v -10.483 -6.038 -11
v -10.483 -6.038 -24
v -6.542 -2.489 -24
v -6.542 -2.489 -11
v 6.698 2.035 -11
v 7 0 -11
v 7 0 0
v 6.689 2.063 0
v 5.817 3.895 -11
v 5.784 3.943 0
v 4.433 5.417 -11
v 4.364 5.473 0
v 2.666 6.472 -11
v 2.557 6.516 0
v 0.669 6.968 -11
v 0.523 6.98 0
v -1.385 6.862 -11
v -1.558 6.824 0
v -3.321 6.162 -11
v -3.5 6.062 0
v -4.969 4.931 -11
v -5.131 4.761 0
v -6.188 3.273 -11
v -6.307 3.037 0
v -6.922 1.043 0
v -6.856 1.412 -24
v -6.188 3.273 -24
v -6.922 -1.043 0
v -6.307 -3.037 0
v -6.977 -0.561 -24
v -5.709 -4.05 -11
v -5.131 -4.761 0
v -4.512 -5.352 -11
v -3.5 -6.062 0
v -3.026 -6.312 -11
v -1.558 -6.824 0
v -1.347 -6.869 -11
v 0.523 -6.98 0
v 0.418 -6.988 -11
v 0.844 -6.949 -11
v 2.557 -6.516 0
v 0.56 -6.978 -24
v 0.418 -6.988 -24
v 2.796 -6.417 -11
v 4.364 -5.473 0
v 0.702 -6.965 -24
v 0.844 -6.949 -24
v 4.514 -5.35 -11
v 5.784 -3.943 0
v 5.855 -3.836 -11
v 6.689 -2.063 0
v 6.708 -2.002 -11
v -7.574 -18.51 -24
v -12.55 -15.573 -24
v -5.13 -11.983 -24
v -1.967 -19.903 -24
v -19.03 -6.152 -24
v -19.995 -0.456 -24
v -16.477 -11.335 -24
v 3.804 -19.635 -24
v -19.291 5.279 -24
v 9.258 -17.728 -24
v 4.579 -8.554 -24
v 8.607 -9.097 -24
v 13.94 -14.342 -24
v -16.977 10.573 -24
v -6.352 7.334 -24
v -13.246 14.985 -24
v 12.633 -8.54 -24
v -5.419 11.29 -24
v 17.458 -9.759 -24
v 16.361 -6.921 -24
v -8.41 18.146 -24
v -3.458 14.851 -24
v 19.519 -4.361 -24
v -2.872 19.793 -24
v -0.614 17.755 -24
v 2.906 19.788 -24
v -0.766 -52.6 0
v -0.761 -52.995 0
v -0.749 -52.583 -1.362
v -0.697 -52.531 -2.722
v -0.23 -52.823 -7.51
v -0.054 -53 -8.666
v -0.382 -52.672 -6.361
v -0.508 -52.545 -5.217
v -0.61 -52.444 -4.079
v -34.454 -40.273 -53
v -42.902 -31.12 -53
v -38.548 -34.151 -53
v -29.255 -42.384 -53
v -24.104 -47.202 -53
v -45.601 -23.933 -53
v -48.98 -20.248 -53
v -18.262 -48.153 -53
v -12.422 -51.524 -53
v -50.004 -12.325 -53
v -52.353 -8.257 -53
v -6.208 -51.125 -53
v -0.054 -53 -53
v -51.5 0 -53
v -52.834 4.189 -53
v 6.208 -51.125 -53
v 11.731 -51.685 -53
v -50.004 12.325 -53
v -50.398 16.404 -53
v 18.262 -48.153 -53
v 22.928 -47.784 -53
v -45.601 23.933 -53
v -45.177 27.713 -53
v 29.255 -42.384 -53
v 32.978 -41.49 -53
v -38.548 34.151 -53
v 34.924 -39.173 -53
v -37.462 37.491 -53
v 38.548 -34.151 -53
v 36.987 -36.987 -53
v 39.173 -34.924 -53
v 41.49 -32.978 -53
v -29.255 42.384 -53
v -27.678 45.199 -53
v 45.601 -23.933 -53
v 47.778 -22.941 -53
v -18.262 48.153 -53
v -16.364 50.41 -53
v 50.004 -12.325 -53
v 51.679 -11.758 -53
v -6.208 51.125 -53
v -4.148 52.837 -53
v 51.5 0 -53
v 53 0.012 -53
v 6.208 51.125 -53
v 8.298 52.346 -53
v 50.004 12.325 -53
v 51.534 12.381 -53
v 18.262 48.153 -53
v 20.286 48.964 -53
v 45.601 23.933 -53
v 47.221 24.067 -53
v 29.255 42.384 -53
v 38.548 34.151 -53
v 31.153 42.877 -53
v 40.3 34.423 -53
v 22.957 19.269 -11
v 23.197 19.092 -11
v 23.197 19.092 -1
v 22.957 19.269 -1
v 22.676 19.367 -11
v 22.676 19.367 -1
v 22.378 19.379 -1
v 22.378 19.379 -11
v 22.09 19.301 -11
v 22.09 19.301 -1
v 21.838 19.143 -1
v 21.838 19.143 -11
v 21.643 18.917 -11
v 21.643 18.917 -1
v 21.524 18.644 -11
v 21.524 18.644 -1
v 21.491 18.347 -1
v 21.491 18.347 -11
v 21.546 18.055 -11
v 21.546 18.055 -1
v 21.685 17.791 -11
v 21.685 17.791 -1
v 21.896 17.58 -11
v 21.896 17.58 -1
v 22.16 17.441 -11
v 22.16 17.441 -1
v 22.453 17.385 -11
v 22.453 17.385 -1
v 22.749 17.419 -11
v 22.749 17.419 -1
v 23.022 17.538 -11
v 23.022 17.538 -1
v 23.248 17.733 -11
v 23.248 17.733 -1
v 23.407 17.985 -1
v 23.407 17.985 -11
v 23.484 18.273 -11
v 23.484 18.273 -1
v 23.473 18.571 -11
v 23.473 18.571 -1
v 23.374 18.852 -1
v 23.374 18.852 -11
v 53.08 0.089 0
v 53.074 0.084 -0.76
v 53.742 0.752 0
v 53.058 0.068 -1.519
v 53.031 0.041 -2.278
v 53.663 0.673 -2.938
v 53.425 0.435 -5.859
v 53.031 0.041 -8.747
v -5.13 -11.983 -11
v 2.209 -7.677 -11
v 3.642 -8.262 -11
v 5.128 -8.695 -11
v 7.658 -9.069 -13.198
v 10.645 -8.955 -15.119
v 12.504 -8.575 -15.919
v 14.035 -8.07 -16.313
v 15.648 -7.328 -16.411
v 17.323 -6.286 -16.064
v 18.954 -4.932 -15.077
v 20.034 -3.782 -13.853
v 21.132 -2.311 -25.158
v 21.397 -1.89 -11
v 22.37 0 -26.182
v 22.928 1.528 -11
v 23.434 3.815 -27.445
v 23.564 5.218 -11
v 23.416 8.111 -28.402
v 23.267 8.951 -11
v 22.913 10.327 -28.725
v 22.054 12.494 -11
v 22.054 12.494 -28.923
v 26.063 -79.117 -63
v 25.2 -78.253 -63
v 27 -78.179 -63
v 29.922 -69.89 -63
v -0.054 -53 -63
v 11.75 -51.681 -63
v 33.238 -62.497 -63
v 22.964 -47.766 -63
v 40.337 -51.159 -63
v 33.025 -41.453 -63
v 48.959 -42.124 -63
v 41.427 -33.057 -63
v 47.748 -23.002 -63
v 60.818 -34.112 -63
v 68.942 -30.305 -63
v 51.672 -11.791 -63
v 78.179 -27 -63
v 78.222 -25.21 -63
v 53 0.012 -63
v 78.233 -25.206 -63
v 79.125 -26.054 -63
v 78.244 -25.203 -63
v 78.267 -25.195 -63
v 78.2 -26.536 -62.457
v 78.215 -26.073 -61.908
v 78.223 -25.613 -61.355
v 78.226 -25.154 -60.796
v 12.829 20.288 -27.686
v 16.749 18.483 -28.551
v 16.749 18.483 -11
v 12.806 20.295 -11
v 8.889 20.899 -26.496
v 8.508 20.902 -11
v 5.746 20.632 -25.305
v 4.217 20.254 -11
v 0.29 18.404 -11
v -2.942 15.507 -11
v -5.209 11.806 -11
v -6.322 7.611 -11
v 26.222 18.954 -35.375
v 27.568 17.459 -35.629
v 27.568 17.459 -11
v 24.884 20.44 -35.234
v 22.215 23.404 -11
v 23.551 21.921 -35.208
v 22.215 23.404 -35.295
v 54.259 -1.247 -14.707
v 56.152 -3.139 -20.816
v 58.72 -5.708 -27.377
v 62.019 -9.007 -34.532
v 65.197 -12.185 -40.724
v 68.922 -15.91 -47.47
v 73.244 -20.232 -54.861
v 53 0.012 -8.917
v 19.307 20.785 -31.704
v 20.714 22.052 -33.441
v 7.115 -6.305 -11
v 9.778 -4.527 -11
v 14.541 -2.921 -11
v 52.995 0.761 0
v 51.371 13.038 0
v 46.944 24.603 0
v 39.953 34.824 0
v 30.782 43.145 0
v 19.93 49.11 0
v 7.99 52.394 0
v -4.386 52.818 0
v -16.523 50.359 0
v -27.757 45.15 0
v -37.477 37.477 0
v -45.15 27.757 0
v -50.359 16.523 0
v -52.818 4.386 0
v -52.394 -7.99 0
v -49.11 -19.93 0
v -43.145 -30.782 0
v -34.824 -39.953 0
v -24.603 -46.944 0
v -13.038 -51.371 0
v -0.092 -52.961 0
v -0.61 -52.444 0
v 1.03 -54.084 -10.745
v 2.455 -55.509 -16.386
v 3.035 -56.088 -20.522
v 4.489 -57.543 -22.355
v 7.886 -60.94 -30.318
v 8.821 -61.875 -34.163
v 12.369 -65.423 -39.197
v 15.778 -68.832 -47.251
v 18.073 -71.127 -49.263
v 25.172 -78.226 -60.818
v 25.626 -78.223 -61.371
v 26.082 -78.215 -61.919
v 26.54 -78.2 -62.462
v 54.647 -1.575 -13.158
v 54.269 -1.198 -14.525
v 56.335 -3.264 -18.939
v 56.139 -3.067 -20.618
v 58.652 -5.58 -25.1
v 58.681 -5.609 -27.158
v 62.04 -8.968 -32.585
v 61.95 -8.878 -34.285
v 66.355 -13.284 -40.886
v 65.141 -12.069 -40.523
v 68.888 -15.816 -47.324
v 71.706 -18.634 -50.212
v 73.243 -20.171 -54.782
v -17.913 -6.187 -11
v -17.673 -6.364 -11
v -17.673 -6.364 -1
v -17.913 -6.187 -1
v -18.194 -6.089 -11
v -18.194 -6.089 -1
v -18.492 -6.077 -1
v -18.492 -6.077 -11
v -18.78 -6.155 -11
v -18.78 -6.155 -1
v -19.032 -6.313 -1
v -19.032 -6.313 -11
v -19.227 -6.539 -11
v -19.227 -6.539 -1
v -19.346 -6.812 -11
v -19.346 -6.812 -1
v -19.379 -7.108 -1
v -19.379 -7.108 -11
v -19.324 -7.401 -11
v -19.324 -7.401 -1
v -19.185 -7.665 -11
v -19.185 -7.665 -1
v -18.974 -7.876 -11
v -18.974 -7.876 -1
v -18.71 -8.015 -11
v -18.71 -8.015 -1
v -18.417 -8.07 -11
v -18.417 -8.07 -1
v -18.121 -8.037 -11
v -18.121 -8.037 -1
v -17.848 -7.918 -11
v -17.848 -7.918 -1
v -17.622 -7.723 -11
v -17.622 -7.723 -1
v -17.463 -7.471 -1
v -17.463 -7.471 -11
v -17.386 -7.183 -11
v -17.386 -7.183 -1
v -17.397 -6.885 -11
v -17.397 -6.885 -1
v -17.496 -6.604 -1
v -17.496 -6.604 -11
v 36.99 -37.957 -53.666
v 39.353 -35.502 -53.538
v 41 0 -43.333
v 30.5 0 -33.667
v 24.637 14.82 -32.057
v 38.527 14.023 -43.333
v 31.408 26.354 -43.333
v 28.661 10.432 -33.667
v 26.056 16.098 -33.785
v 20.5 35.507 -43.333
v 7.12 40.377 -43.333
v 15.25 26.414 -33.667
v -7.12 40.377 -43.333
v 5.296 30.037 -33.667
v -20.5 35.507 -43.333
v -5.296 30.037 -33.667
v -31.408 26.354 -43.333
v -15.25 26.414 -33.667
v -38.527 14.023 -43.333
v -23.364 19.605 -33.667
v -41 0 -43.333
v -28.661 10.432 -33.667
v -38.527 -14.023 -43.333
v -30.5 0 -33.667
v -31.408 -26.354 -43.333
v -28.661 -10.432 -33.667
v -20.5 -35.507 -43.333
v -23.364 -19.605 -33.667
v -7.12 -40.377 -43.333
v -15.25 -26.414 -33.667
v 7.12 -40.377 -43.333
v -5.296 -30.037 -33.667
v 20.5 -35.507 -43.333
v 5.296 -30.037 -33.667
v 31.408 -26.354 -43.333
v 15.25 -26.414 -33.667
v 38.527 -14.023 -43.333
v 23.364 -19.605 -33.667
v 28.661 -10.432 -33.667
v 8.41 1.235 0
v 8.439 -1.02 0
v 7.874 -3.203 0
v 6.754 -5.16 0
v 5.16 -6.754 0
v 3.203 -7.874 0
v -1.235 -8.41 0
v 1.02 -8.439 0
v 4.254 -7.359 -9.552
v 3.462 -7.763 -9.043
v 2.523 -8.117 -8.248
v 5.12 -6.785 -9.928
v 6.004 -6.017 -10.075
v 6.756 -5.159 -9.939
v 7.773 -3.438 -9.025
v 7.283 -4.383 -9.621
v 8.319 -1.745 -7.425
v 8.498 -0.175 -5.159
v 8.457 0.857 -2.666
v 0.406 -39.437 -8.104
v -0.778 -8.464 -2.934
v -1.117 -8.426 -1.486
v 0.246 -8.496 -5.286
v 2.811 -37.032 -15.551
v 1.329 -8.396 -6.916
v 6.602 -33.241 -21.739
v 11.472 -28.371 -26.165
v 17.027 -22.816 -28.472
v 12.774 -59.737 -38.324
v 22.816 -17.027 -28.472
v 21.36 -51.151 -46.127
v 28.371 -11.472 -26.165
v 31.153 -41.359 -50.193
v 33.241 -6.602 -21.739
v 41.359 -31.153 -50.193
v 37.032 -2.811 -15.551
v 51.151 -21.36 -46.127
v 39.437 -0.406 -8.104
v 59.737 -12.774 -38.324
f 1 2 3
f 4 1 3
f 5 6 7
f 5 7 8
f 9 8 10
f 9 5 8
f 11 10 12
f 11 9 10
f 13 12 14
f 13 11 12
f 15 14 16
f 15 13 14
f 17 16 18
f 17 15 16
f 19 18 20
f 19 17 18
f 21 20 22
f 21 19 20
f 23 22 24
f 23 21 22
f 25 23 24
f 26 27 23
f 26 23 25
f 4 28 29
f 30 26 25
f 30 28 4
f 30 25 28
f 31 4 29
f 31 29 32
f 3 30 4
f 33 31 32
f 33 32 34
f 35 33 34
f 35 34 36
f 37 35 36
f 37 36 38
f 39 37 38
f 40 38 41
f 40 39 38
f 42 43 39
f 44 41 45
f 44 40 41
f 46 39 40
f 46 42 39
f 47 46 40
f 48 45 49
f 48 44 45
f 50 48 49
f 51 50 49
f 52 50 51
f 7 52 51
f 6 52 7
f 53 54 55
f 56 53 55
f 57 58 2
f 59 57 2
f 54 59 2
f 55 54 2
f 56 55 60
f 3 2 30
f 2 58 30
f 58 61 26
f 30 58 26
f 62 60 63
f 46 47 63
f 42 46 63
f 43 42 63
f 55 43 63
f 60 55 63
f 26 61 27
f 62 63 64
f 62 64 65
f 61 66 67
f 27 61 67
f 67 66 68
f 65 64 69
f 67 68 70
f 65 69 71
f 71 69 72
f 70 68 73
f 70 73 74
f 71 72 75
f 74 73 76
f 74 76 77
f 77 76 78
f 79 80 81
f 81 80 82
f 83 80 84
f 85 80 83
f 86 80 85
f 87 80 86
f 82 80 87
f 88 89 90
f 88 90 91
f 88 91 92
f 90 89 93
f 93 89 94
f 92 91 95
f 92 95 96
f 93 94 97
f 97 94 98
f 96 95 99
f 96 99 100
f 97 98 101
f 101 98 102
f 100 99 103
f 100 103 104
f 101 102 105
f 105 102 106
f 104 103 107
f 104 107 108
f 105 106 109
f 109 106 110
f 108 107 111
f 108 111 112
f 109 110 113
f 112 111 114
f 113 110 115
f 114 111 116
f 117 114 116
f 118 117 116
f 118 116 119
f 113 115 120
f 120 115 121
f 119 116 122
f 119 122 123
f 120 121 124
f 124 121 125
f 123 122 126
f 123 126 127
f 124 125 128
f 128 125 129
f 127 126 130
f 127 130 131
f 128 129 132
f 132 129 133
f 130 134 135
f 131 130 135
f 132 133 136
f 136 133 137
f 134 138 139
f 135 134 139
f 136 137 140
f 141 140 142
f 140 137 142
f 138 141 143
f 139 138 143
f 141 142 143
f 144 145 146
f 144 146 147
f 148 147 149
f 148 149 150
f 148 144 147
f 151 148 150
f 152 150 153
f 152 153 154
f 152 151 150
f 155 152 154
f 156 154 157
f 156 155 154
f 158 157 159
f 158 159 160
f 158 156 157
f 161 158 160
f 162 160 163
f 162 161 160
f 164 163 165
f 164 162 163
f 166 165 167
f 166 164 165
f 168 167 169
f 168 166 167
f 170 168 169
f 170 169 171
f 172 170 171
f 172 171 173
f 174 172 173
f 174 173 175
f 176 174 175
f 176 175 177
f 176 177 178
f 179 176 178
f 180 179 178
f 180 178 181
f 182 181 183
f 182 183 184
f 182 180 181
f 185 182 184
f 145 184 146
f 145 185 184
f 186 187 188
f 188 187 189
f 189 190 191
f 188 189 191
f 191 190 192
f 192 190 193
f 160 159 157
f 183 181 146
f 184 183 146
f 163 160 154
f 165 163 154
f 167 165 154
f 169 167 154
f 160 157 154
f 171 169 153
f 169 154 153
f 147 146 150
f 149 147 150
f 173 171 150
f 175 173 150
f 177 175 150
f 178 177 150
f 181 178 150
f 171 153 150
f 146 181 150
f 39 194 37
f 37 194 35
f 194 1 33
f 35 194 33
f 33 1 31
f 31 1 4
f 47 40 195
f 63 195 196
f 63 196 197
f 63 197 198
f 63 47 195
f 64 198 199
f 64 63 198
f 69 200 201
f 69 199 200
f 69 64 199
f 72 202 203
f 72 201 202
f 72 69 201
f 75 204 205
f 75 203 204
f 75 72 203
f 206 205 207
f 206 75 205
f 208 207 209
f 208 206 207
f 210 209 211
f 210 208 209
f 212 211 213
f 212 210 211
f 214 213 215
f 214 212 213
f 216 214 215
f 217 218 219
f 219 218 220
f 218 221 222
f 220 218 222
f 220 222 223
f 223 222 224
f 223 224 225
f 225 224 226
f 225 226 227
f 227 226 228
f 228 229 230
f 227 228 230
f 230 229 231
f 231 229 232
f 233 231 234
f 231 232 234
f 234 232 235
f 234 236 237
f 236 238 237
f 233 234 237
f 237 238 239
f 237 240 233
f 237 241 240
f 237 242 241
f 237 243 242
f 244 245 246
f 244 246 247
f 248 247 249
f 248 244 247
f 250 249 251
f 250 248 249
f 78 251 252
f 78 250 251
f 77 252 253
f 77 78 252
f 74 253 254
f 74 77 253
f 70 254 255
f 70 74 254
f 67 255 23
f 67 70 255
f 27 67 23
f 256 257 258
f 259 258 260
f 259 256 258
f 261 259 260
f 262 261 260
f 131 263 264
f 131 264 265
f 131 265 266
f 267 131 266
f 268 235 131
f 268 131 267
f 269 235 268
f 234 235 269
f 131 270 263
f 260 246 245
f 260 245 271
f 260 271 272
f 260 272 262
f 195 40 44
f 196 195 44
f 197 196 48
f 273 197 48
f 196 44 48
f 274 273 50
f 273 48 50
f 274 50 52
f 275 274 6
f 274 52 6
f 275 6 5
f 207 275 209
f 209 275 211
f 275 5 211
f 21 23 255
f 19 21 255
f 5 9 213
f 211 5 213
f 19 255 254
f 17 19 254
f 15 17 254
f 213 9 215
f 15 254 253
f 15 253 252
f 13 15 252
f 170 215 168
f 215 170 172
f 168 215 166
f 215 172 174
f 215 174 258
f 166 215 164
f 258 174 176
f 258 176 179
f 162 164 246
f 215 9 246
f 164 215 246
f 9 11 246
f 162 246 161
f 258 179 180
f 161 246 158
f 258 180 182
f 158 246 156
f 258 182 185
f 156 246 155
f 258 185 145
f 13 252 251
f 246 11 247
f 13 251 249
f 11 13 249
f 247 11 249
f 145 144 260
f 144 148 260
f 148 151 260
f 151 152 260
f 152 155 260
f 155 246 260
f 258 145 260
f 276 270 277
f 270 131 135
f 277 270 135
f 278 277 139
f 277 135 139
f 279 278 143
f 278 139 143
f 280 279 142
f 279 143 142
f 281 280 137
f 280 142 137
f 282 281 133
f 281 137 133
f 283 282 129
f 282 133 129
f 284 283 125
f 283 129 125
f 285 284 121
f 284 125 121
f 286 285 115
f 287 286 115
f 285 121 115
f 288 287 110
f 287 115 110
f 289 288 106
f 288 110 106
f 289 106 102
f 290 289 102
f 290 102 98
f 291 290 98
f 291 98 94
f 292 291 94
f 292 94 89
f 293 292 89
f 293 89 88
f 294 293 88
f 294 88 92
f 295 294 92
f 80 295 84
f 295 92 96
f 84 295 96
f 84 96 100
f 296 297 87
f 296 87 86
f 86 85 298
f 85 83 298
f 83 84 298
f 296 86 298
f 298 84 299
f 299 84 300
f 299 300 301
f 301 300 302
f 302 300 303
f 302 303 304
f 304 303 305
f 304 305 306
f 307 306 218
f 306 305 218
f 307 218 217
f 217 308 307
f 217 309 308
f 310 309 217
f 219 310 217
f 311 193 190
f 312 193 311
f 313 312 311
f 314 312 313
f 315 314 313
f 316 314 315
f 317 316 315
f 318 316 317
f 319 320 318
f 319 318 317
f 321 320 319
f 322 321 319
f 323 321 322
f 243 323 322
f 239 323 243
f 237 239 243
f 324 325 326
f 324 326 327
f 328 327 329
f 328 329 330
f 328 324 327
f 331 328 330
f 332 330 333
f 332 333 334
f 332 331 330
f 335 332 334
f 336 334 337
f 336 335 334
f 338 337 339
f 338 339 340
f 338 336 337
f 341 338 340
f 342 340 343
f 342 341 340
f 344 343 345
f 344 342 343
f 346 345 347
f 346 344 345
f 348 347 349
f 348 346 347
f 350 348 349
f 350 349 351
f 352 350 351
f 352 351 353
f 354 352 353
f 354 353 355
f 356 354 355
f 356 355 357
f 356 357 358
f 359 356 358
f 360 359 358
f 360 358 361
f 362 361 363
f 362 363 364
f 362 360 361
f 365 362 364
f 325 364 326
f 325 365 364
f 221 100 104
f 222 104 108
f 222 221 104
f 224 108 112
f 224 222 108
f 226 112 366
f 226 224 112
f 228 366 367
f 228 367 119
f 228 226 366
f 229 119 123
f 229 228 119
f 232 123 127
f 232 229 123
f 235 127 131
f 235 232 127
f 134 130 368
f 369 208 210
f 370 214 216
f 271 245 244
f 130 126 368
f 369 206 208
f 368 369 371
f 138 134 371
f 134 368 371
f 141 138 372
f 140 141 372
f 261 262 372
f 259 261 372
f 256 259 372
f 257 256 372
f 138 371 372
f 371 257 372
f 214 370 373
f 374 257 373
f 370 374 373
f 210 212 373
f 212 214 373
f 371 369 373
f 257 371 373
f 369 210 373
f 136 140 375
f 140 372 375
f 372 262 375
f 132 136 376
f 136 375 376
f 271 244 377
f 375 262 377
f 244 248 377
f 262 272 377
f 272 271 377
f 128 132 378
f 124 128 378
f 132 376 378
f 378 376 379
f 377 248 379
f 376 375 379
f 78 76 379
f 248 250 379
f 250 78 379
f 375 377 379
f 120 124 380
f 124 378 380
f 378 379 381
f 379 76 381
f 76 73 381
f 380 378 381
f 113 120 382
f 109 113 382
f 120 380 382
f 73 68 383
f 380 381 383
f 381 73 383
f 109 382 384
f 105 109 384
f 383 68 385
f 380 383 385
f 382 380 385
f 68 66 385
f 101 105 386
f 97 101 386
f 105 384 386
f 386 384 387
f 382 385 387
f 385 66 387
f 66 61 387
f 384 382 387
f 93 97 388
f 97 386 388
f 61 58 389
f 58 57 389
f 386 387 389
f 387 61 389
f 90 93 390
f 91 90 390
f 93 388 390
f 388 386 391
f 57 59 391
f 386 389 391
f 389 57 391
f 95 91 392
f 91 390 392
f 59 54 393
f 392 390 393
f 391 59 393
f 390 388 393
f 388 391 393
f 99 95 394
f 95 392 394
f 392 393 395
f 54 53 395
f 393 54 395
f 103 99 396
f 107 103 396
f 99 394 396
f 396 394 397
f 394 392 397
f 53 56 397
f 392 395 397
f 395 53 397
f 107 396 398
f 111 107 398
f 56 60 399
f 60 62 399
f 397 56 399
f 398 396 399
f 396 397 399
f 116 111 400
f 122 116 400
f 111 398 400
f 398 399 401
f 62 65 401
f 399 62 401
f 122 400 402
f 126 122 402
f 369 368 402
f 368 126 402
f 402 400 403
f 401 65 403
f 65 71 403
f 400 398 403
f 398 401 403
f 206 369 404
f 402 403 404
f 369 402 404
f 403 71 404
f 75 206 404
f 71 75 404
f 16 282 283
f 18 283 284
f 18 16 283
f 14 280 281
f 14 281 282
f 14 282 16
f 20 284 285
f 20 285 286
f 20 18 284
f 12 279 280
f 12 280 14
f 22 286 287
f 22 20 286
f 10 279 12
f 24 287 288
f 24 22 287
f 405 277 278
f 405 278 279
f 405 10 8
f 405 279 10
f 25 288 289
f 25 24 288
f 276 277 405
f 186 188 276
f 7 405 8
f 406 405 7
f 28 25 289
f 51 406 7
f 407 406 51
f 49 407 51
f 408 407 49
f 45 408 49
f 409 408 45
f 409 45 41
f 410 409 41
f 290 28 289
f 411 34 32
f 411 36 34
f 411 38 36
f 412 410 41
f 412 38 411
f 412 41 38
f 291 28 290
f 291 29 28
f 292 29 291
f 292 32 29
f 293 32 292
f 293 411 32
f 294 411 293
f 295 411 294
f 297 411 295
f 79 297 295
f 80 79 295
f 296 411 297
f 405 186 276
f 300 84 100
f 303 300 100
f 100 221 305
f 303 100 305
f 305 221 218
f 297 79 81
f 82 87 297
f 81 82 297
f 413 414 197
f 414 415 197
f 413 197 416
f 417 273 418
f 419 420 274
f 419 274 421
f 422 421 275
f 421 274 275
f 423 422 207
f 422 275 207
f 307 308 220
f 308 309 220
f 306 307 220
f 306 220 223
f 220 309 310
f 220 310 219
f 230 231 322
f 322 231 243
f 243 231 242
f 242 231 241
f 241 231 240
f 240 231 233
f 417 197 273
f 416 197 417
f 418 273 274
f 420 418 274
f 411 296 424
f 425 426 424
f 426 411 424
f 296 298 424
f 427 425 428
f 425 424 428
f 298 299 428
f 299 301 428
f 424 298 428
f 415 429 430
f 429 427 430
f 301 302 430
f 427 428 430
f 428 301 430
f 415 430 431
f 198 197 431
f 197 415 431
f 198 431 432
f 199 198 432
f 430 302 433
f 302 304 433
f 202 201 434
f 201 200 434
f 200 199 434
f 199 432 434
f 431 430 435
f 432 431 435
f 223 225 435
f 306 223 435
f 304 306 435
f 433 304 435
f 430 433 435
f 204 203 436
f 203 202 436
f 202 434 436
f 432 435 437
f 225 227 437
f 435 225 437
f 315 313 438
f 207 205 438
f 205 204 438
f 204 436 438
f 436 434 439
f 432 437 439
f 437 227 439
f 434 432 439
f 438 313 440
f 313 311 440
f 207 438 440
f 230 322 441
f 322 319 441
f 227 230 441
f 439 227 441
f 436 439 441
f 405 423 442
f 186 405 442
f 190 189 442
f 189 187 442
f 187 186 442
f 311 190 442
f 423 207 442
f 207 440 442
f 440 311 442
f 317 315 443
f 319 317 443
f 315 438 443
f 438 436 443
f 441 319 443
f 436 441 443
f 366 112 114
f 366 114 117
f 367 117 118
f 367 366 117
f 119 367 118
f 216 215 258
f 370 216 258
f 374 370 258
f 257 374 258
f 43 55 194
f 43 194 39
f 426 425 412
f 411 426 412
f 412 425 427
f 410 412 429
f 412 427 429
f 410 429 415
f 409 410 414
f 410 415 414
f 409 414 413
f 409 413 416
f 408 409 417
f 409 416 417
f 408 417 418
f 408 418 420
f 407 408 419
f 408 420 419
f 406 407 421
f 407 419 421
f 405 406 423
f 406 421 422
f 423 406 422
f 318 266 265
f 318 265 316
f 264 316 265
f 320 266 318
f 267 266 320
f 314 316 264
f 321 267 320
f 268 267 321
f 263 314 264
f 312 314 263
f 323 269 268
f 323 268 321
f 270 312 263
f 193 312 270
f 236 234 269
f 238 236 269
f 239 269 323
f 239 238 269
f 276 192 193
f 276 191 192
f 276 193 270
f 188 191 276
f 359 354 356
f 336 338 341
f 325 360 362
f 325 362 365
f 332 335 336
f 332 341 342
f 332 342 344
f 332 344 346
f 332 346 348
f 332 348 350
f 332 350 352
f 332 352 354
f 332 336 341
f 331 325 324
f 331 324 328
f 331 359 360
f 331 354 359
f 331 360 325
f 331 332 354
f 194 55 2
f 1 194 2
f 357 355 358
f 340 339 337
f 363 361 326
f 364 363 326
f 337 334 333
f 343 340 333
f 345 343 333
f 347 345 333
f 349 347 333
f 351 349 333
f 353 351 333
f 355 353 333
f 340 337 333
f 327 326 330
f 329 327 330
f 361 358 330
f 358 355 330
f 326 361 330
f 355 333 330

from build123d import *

# Parameters (mm, degrees)
BOX039_W                    = 44
BOX039_H                    = 8
BOX039_DEPTH                = 80
BOX039_PLACEMENT_ANGLE      = 42
CYLINDER023_R               = 1
CYLINDER023_DEPTH           = 10
CYLINDER023_PLACEMENT_ANGLE = 45
CYLINDER024_R               = 1
CYLINDER024_DEPTH           = 10
CYLINDER024_PLACEMENT_ANGLE = 45
CYLINDER022_R               = 15
CYLINDER022_DEPTH           = 80
CYLINDER022_PLACEMENT_ANGLE = 39
CYLINDER026_R               = 8.5
CYLINDER026_DEPTH           = 45
BOX038_W                    = 100
BOX038_H                    = 200
BOX038_DEPTH                = 50
BOX038_PITCH_ANGLE          = 60
BOX038_PLACEMENT_ANGLE      = -45
BOX041_W                    = 100
BOX041_H                    = 100
BOX041_DEPTH                = 100
BOX041_PLACEMENT_ANGLE      = 45
BOX042_W                    = 100
BOX042_H                    = 100
BOX042_DEPTH                = 100
BOX042_PLACEMENT_ANGLE      = 45
BOX043_W                    = 200
BOX043_H                    = 200
BOX043_DEPTH                = 200
CONE008_ANGLE               = 180
CONE008_ROLL_ANGLE          = -90
CONE008_PLACEMENT_ANGLE     = -135
CONE007_ANGLE               = 180
CONE007_ROLL_ANGLE          = -90
CONE007_PLACEMENT_ANGLE     = -135
CYLINDER027_R               = 53
CYLINDER027_DEPTH           = 60
BOX044_W                    = 38
BOX044_H                    = 75
BOX044_DEPTH                = 63
BOX044_PLACEMENT_ANGLE      = 45
CYLINDER025_R               = 53
CYLINDER025_DEPTH           = 53
TUBE018_R                   = 8.5
TUBE018_R_2                 = 7
TUBE018_DEPTH               = 53


with BuildPart() as cube039:
    # Box039 → Box039 (new body)
    with BuildSketch(Plane.XY):
        with Locations((22, 4)):
            Rectangle(BOX039_W, BOX039_H)
    extrude(amount=BOX039_DEPTH)


with BuildPart() as cube039_1:
    # Box039 placement: moved
    add(cube039.part.moved(Location((-5.13, -11.9828, -91))).rotate(Axis((-5.13, -11.9828, -91), (0, 0, 1)), BOX039_PLACEMENT_ANGLE))


with BuildPart() as cone009:
    # Cone009 → Cone009 (revolve)
    with BuildSketch(Plane(origin=(0, 0, -53), x_dir=(1, 0, 0), z_dir=(0, -1, 0))):
        Polygon((0, 0), (51.5, 0), (20, 29), (0, 29), align=None)
    revolve(axis=Axis((0, 0, -53), (0, 0, 1)))


with BuildPart() as cylinder023:
    # Cylinder023 → Cylinder023 (new body)
    with BuildSketch(Plane.XY):
        Circle(CYLINDER023_R)
    extrude(amount=CYLINDER023_DEPTH)


with BuildPart() as cylinder023_1:
    # Cylinder023 placement: moved
    add(cylinder023.part.moved(Location((-18.38, -7.07107, -11))).rotate(Axis((-18.38, -7.07107, -11), (0, 0, 1)), CYLINDER023_PLACEMENT_ANGLE))


with BuildPart() as cylinder024:
    # Cylinder024 → Cylinder024 (new body)
    with BuildSketch(Plane.XY):
        Circle(CYLINDER024_R)
    extrude(amount=CYLINDER024_DEPTH)


with BuildPart() as cylinder024_1:
    # Cylinder024 placement: moved
    add(cylinder024.part.moved(Location((22.49, 18.3848, -11))).rotate(Axis((22.49, 18.3848, -11), (0, 0, 1)), CYLINDER024_PLACEMENT_ANGLE))


with BuildPart() as fusion009012:
    # Cylinder022 → Cylinder022 (new body)
    with BuildSketch(Plane.XY):
        Circle(CYLINDER022_R)
    extrude(amount=CYLINDER022_DEPTH)


with BuildPart() as fusion009012_1:
    # Cylinder022 placement: moved
    add(fusion009012.part.moved(Location((8.58, 5.90251, -91))).rotate(Axis((8.58, 5.90251, -91), (0, 0, 1)), CYLINDER022_PLACEMENT_ANGLE))

    # Fusion009012: union Cube039, Cone009, Cylinder023, Cylinder024
    add(cube039_1.part)
    add(cone009.part)
    add(cylinder023_1.part)
    add(cylinder024_1.part)


with BuildPart() as cylinder026:
    # Cylinder026 → Cylinder026 (new body)
    with BuildSketch(Plane.XY.offset(-43)):
        Circle(CYLINDER026_R)
    extrude(amount=CYLINDER026_DEPTH)


with BuildPart() as cube038:
    # Box038 → Box038 (new body)
    with BuildSketch(Plane.XY):
        with Locations((50, 100)):
            Rectangle(BOX038_W, BOX038_H)
    extrude(amount=BOX038_DEPTH)


with BuildPart() as cube038_1:
    # Box038 pitch: moved
    add(cube038.part.rotate(Axis((0, 0, 0), (0, 1, 0)), BOX038_PITCH_ANGLE))


with BuildPart() as cube038_2:
    # Box038 placement: moved
    add(cube038_1.part.moved(Location((-38.183766, -91.923882, 0))).rotate(Axis((-38.183766, -91.923882, 0), (0, 0, 1)), BOX038_PLACEMENT_ANGLE))


with BuildPart() as cube041:
    # Box041 → Box041 (new body)
    with BuildSketch(Plane.XY):
        with Locations((50, 50)):
            Rectangle(BOX041_W, BOX041_H)
    extrude(amount=BOX041_DEPTH)


with BuildPart() as cube041_1:
    # Box041 placement: moved
    add(cube041.part.moved(Location((-71.320657, -123.15444, -92))).rotate(Axis((-71.320657, -123.15444, -92), (0, 0, -1)), BOX041_PLACEMENT_ANGLE))


with BuildPart() as cube042:
    # Box042 → Box042 (new body)
    with BuildSketch(Plane.XY):
        with Locations((50, 50)):
            Rectangle(BOX042_W, BOX042_H)
    extrude(amount=BOX042_DEPTH)


with BuildPart() as cube042_1:
    # Box042 placement: moved
    add(cube042.part.moved(Location((53.030932, 0.040624, -92))).rotate(Axis((53.030932, 0.040624, -92), (0, 0, -1)), BOX042_PLACEMENT_ANGLE))


with BuildPart() as cube043:
    # Box043 → Box043 (new body)
    with BuildSketch(Plane(origin=(-111, -128, -263), x_dir=(1, 0, 0), z_dir=(0, 0, 1))):
        with Locations((100, 100)):
            Rectangle(BOX043_W, BOX043_H)
    extrude(amount=BOX043_DEPTH)


with BuildPart() as fusion009014:
    # Cone008 → Cone008 (revolve)
    with BuildSketch(Plane.XZ):
        Polygon((0, 0), (2, 0), (78, 80), (0, 80), align=None)
    revolve(axis=Axis((0, 0, 0), (0, 0, 1)), revolution_arc=CONE008_ANGLE)


with BuildPart() as fusion009014_1:
    # Cone008 roll: moved
    add(fusion009014.part.rotate(Axis((0, 0, 0), (1, 0, 0)), CONE008_ROLL_ANGLE))


with BuildPart() as fusion009014_2:
    # Cone008 placement: moved
    add(fusion009014_1.part.rotate(Axis((0, 0, 0), (0, 0, 1)), CONE008_PLACEMENT_ANGLE))

    # Fusion009014: union Cube041, Cube042, Cube043
    add(cube041_1.part)
    add(cube042_1.part)
    add(cube043.part)


with BuildPart() as cone002_vonkajsi001:
    # Cone007 → Cone007 (revolve)
    with BuildSketch(Plane.XZ):
        Polygon((0, 0), (2, 0), (80, 80), (0, 80), align=None)
    revolve(axis=Axis((0, 0, 0), (0, 0, 1)), revolution_arc=CONE007_ANGLE)


with BuildPart() as cone002_vonkajsi001_1:
    # Cone007 roll: moved
    add(cone002_vonkajsi001.part.rotate(Axis((0, 0, 0), (1, 0, 0)), CONE007_ROLL_ANGLE))


with BuildPart() as cone002_vonkajsi001_2:
    # Cone007 placement: moved
    add(cone002_vonkajsi001_1.part.rotate(Axis((0, 0, 0), (0, 0, 1)), CONE007_PLACEMENT_ANGLE))


with BuildPart() as cut009009:
    # Cut009017 base: copy of Cone002_vonkajsi001
    add(cone002_vonkajsi001_2.part)

    # Cut009017: cut Fusion009014
    add(fusion009014_2.part, mode=Mode.SUBTRACT)

    # Cut009009: cut Cube038
    add(cube038_2.part, mode=Mode.SUBTRACT)


with BuildPart() as cylinder027:
    # Cylinder027 → Cylinder027 (new body)
    with BuildSketch(Plane.XY.offset(-63)):
        Circle(CYLINDER027_R)
    extrude(amount=CYLINDER027_DEPTH)


with BuildPart() as cut009012:
    # Box044 → Box044 (new body)
    with BuildSketch(Plane.XY):
        with Locations((19, 37.5)):
            Rectangle(BOX044_W, BOX044_H)
    extrude(amount=BOX044_DEPTH)


with BuildPart() as cut009012_1:
    # Box044 placement: moved
    add(cut009012.part.moved(Location((-0.609979, -52.443762, -63))).rotate(Axis((-0.609979, -52.443762, -63), (0, 0, -1)), BOX044_PLACEMENT_ANGLE))

    # Cut009012: cut Cylinder027
    add(cylinder027.part, mode=Mode.SUBTRACT)


with BuildPart() as cut009010:
    # Cylinder025 → Cylinder025 (new body)
    with BuildSketch(Plane.XY.offset(-53)):
        Circle(CYLINDER025_R)
    extrude(amount=CYLINDER025_DEPTH)

    # Fusion009013: union Cut009012
    add(cut009012_1.part)

    # Cut009011: cut Cone002_vonkajsi001
    add(cone002_vonkajsi001_2.part, mode=Mode.SUBTRACT)

    # Fusion009011: union Cut009009
    add(cut009009.part)

    # Cut009010: cut Cylinder026
    add(cylinder026.part, mode=Mode.SUBTRACT)


with BuildPart() as cut009_middle002:
    # Tube018 → Tube018 (new body)
    with BuildSketch(Plane.XY.offset(-53)):
        Circle(TUBE018_R)
        Circle(TUBE018_R_2, mode=Mode.SUBTRACT)
    extrude(amount=TUBE018_DEPTH)

    # Fusion009010: union Cut009010
    add(cut009010.part)

    # Cut009013: cut Fusion009012
    add(fusion009012_1.part, mode=Mode.SUBTRACT)


solid = cut009_middle002.part
